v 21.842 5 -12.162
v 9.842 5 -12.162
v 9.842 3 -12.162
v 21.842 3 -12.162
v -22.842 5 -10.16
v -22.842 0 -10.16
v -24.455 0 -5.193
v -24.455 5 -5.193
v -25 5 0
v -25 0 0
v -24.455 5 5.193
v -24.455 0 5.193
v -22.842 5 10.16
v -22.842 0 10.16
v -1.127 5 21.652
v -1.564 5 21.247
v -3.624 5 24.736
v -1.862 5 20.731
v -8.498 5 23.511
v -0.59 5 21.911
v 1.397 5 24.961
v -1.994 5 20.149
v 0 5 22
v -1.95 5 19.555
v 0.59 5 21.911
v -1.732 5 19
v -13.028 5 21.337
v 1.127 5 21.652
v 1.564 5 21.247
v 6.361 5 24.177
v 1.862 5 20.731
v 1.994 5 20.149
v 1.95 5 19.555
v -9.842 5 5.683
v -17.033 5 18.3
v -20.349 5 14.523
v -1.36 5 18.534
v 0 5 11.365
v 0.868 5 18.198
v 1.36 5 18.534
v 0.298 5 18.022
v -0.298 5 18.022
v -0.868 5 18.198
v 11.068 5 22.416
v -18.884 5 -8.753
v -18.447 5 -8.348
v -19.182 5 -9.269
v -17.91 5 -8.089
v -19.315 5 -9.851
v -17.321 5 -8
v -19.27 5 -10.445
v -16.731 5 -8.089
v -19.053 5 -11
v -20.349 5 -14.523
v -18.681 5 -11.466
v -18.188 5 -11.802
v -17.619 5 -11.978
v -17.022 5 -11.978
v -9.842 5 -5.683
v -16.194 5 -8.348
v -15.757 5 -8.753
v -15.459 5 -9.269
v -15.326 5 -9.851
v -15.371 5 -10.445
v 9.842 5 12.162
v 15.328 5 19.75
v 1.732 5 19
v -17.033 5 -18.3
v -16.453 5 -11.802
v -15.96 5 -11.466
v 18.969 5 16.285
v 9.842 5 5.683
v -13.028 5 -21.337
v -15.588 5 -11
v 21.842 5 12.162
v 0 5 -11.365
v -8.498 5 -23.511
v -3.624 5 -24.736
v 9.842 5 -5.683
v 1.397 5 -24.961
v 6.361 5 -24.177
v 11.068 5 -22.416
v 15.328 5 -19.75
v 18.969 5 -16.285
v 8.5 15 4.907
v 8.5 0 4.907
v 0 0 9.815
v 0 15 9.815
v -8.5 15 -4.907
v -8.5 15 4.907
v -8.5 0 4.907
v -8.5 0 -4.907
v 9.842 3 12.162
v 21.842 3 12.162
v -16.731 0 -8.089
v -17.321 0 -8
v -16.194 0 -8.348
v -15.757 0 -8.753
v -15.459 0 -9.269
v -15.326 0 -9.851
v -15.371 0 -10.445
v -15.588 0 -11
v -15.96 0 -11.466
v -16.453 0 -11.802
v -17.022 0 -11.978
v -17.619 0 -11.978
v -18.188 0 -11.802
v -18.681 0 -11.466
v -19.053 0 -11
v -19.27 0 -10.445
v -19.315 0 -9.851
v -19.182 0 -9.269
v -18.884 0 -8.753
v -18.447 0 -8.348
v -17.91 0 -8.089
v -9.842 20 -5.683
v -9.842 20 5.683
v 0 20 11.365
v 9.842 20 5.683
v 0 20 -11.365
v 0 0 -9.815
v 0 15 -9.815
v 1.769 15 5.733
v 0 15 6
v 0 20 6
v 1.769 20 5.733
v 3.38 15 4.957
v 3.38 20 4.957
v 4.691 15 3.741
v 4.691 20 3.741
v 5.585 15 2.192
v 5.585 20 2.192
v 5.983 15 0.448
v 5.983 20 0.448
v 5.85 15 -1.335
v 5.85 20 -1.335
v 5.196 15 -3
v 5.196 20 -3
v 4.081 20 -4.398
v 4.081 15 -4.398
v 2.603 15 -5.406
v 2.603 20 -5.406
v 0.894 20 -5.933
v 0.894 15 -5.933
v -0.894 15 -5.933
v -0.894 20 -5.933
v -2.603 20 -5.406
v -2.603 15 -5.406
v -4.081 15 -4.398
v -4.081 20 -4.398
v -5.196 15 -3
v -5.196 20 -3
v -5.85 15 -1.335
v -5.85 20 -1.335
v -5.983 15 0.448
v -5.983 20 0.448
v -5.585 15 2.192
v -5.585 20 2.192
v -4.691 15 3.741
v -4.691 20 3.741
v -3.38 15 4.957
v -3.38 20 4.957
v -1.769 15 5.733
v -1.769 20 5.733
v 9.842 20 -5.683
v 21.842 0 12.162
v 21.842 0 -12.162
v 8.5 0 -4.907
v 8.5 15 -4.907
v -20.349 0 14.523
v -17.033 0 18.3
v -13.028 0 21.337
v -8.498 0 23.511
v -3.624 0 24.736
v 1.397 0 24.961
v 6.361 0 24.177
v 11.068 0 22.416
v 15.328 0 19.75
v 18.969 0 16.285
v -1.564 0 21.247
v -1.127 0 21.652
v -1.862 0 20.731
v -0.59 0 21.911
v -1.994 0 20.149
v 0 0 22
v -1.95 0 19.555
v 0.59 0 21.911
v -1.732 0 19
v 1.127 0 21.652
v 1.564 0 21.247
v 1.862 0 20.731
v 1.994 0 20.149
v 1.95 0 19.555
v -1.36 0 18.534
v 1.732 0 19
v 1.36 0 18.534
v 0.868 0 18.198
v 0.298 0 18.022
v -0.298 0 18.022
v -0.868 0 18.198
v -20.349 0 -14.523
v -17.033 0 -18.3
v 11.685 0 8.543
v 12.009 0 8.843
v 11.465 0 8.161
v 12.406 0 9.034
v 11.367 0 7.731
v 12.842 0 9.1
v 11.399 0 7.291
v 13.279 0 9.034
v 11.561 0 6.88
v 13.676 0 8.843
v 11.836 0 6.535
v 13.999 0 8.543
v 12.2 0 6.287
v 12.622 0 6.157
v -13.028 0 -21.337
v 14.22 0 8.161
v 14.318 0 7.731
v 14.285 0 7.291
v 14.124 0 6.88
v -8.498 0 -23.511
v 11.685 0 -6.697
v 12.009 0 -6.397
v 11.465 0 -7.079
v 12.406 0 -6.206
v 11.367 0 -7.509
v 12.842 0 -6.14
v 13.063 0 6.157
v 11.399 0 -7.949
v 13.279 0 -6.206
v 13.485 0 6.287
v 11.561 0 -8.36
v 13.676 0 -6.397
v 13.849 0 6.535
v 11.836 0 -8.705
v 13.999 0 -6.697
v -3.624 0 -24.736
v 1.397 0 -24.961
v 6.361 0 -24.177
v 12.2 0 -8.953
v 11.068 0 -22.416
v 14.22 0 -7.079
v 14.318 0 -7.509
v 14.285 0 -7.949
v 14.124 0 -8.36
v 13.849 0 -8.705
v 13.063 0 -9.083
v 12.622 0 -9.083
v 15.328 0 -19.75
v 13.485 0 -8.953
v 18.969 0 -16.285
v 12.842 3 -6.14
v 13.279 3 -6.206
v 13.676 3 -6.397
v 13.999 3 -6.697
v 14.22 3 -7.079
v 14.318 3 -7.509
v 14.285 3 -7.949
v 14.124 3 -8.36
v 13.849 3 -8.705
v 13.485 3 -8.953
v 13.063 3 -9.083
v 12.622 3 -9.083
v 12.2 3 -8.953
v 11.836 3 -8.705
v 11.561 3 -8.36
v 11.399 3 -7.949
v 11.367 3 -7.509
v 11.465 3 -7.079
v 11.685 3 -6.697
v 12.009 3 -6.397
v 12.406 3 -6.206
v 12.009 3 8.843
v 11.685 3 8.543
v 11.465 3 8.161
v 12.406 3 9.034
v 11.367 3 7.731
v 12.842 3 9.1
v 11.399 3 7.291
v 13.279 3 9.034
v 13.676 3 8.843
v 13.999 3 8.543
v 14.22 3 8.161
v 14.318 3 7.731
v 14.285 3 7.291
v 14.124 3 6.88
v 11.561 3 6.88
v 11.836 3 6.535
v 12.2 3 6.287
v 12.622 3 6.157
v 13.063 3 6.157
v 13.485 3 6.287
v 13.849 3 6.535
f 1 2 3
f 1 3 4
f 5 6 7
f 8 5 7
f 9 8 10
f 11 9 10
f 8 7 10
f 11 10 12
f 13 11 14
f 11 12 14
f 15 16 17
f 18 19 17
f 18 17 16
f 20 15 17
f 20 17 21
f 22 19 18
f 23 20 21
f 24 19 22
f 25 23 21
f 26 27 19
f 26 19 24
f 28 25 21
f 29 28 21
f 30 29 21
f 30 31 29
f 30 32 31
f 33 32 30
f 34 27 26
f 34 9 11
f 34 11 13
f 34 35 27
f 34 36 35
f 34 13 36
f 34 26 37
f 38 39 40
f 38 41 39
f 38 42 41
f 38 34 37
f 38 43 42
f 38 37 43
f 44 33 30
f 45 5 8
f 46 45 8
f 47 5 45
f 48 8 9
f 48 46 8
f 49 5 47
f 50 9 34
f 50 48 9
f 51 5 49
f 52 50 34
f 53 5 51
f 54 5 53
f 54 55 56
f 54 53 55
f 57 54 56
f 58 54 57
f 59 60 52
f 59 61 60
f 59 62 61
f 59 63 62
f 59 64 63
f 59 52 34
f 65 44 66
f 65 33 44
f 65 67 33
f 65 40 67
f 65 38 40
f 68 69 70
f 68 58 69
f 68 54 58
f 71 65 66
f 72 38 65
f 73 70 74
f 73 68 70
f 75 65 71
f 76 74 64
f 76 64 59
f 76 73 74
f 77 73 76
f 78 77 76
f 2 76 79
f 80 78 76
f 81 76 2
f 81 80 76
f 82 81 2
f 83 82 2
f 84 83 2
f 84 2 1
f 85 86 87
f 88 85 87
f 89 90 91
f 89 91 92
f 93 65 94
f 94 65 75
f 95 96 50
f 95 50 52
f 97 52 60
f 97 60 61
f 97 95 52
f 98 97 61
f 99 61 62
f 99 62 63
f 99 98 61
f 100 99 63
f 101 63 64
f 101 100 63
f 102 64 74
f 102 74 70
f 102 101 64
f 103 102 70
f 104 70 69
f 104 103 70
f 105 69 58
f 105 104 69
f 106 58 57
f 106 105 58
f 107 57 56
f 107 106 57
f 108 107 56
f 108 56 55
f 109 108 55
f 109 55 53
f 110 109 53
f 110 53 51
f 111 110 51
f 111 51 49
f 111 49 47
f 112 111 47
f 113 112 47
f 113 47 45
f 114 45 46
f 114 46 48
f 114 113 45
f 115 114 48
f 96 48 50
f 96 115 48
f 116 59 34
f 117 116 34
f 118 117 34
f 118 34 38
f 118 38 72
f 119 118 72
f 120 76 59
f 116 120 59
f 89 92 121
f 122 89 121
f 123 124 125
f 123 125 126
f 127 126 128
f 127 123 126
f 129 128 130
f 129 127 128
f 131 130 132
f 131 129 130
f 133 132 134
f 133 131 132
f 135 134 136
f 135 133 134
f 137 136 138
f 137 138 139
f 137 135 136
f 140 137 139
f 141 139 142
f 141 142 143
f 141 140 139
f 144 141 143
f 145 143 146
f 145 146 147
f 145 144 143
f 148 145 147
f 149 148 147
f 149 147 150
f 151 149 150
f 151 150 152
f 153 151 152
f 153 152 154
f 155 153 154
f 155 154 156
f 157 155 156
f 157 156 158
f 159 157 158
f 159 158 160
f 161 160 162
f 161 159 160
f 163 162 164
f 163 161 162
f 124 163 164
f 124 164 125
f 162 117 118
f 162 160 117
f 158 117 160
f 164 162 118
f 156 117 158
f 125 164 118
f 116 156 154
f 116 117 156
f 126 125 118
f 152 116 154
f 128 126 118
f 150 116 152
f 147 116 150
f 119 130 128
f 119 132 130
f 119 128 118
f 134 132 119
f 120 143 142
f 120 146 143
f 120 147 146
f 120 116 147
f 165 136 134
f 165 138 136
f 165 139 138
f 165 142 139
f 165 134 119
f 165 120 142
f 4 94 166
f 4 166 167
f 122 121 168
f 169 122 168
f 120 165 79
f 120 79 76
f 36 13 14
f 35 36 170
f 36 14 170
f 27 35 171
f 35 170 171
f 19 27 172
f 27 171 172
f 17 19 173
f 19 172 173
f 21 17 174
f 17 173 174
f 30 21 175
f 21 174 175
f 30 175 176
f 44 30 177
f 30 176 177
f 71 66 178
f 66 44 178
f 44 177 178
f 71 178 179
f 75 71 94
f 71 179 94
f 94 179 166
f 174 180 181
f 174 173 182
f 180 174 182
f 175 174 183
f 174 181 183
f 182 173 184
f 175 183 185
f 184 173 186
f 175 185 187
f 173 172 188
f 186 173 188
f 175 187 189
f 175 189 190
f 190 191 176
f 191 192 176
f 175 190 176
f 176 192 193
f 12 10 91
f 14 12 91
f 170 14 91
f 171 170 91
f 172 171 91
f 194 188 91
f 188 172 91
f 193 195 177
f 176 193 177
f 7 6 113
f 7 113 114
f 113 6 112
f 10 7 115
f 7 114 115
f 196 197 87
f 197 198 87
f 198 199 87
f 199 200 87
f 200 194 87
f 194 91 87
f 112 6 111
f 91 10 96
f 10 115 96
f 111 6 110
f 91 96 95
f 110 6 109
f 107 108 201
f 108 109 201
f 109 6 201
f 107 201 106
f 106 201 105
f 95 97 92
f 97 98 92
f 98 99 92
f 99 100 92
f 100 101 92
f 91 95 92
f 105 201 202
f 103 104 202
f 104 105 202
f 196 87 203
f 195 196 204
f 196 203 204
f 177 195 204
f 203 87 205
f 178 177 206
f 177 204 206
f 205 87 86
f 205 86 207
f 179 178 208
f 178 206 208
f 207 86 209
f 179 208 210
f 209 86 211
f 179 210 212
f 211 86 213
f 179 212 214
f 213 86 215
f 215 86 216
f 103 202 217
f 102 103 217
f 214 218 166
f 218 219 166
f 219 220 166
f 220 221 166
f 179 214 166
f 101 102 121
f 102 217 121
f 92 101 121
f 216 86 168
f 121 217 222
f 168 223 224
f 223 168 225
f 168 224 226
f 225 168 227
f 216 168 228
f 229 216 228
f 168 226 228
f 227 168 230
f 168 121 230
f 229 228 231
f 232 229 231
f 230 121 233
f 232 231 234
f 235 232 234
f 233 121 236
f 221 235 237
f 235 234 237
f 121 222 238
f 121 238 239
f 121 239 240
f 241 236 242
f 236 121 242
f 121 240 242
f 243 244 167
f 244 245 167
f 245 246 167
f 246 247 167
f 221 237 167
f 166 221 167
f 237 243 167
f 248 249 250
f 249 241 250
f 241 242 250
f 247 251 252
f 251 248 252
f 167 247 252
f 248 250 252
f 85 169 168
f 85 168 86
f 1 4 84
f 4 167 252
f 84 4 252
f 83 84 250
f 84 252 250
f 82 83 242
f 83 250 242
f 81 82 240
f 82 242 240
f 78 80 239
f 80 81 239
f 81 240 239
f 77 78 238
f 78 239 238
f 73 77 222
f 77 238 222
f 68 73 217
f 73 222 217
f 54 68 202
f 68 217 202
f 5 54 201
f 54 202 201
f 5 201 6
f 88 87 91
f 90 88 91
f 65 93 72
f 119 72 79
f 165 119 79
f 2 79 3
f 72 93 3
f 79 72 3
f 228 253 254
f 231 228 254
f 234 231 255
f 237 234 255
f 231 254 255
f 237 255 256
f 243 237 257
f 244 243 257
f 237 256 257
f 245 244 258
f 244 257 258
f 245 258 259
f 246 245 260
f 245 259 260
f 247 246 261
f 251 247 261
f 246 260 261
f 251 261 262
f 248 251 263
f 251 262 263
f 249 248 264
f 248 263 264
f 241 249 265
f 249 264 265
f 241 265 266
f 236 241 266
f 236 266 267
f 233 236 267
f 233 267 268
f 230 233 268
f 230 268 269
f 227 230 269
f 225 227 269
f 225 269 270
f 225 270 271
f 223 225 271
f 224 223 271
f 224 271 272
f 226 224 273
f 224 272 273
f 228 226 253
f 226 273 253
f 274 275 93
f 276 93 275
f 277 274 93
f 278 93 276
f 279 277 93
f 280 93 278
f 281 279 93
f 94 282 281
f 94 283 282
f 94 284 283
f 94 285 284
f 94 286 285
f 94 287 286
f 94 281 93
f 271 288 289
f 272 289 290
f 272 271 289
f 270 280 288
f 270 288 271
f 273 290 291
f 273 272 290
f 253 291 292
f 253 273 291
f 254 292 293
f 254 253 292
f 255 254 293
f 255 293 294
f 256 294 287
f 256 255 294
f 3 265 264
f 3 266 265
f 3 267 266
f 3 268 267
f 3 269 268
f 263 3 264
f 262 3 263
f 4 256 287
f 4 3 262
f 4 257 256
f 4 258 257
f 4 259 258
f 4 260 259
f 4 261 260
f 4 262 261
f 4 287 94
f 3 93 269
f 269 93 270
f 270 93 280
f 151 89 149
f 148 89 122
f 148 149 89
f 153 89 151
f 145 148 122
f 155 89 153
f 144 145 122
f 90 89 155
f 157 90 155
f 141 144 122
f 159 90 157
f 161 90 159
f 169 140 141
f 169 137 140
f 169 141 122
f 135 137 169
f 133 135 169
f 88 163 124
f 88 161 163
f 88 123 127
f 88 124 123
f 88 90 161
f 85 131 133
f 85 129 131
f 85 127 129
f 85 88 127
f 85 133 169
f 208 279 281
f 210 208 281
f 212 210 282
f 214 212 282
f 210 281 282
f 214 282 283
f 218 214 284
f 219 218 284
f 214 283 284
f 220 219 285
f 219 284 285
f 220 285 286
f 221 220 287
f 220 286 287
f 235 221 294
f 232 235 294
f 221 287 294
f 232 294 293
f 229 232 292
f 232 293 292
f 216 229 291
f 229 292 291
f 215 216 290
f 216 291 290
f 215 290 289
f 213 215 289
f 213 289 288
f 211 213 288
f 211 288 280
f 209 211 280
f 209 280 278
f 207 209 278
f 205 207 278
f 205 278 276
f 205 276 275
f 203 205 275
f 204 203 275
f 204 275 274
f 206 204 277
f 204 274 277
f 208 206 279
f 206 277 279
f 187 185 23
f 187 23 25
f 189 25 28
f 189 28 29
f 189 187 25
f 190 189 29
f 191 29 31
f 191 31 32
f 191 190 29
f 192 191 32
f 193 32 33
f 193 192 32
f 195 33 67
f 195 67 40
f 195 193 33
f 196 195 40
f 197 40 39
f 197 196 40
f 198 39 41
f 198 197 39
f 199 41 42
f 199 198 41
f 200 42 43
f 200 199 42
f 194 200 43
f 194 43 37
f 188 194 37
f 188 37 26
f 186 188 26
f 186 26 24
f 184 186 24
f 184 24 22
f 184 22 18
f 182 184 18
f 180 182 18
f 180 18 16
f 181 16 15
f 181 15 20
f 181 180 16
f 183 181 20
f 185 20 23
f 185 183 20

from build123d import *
from build123d.topology import SkipClean

# Parameters (mm, degrees)
SKETCH_1_R           = 25
SKETCH_1_R_2         = 2
SKETCH_1_R_3         = 15
EXTRUDE_1_DEPTH      = 5
EXTRUDE_START        = -5
EXTRUDE_2_DEPTH      = 5
CUT_EXTRUDE_START    = -5
SKETCH_3_R           = 1.48
CUT_EXTRUDE_1_DEPTH  = 5
SKETCH_4_W           = 8.547618338
SKETCH_4_H           = 20.32
SKETCH_4_R           = 1.48
SKETCH_4_R_2         = 1.532611102
EXTRUDE_3_DEPTH      = 25
SKETCH_5_R           = 1.48
EXTRUDE_4_DEPTH      = 15
SKETCH_6_W           = 8.547618338
SKETCH_6_H           = 20.32
CUT_EXTRUDE_2_DEPTH  = 10
CUT_EXTRUDE_START_2  = -15
SKETCH_7_R           = 1.48
SKETCH_7_R_2         = 1.532611102
CUT_EXTRUDE_3_DEPTH  = 15
EXTRUDE_5_DEPTH      = 15
SKETCH_9_W           = 8.547618338
SKETCH_9_H           = 20.32
CUT_EXTRUDE_4_DEPTH  = 20
SKETCH_10_W          = 8.54761834
SKETCH_10_H          = 20.32
EXTRUDE_6_DEPTH      = 10
EXTRUDE_7_DEPTH      = 5
CUT_EXTRUDE_5_DEPTH  = 30
SKETCH_13_R          = 15
SKETCH_13_R_2        = 6.5
EXTRUDE_8_DEPTH      = 5
SKETCH_14_R          = 1.48
CUT_EXTRUDE_6_DEPTH  = 5
SKETCH_15_W          = 14.772216158
SKETCH_15_H          = 22.255287634
CUT_EXTRUDE_7_DEPTH  = 15
SKETCH_16_R          = 6.5
SKETCH_16_R_2        = 6
EXTRUDE_9_DEPTH      = 5
CUT_EXTRUDE_START_3  = -2
SKETCH_17_W          = 6.857896117
SKETCH_17_H          = 20.32
SKETCH_17_R          = 1.48
CUT_EXTRUDE_8_DEPTH  = 2
CUT_EXTRUDE_9_DEPTH  = 2
SKETCH_19_W          = 12
SKETCH_19_H          = 24.323680916
CUT_EXTRUDE_10_DEPTH = 2
EXTRUDE_START_2      = -3
SKETCH_20_R          = 2
EXTRUDE_10_DEPTH     = 3
SKETCH_21_R          = 1.48
CUT_EXTRUDE_11_DEPTH = 3
SKETCH_22_W          = 10.536991634
SKETCH_22_H          = 24.323680916
CUT_EXTRUDE_12_DEPTH = 3
SKETCH_23_R          = 9.842381662
SKETCH_23_R_2        = 6
EXTRUDE_11_DEPTH     = 15
CUT_EXTRUDE_13_DEPTH = 15
EXTRUDE_START_3      = -15
SKETCH_25_R          = 6
EXTRUDE_12_DEPTH     = 15
CUT_EXTRUDE_14_DEPTH = 15


with BuildPart() as part:
    # 草图1 → 凸台-拉伸1 (new body)
    with BuildSketch(Plane(origin=(0, 0, 0), x_dir=(1, 0, 0), z_dir=(0, 1, 0))):
        with Locations(Location((0, 0, 0), (0, 0, 270))):
            Circle(SKETCH_1_R)
        with Locations(Location((-17.320508076, 10, 0), (0, 0, 270))):
            Circle(SKETCH_1_R_2, mode=Mode.SUBTRACT)
        with Locations(Location((17.320508076, 10, 0), (0, 0, 270))):
            Circle(SKETCH_1_R_2, mode=Mode.SUBTRACT)
        with Locations(Location((0, -20, 0), (0, 0, 270))):
            Circle(SKETCH_1_R_2, mode=Mode.SUBTRACT)
        with Locations(Location((0, 0, 0), (0, 0, 270))):
            Circle(SKETCH_1_R_3, mode=Mode.SUBTRACT)
    extrude(amount=EXTRUDE_1_DEPTH)

    # 草图2 → 凸台-拉伸2 (add)
    with BuildSketch(Plane(origin=(0, 5, 0), x_dir=(1, 0, 0), z_dir=(0, 1, 0)).offset(EXTRUDE_START)):
        with BuildLine():
            Line((-22.842381662, 10.16), (-31.39, 10.16))
            Line((-31.39, 10.16), (-31.39, -10.16))
            Line((-31.39, -10.16), (-22.842381662, -10.16))
            ThreePointArc((-22.842381662, -10.16), (-23.266520659, -9.147076932), (-23.645768039, -8.116505025))
            ThreePointArc((-23.645768039, -8.116505025), (-26.455891038, -8.05087419), (-24.158684413, -6.431016049))
            ThreePointArc((-24.158684413, -6.431016049), (-25, 0), (-24.158684413, 6.431016049))
            ThreePointArc((-24.158684413, 6.431016049), (-26.455891038, 8.05087419), (-23.645768039, 8.116505025))
            ThreePointArc((-23.645768039, 8.116505025), (-23.266520659, 9.147076932), (-22.842381662, 10.16))
        make_face()
        with BuildLine():
            Line((-22.842381662, -10.16), (-22.842381662, 10.16))
            ThreePointArc((-22.842381662, 10.16), (-23.266520659, 9.147076932), (-23.645768039, 8.116505025))
            ThreePointArc((-23.645768039, 8.116505025), (-23.581599626, 7.871929254), (-23.56, 7.62))
            ThreePointArc((-23.56, 7.62), (-23.718117428, 6.954397667), (-24.158684413, 6.431016049))
            ThreePointArc((-24.158684413, 6.431016049), (-25, 0), (-24.158684413, -6.431016049))
            ThreePointArc((-24.158684413, -6.431016049), (-23.718117428, -6.954397667), (-23.56, -7.62))
            ThreePointArc((-23.56, -7.62), (-23.581599626, -7.871929254), (-23.645768039, -8.116505025))
            ThreePointArc((-23.645768039, -8.116505025), (-23.266520659, -9.147076932), (-22.842381662, -10.16))
        make_face()
    extrude(amount=EXTRUDE_2_DEPTH)

    # 草图3 → 切除-拉伸1 (cut)
    with BuildSketch(Plane(origin=(0, 5, 0), x_dir=(1, 0, 0), z_dir=(0, 1, 0)).offset(CUT_EXTRUDE_START)):
        with Locations(Location((-25.04, 7.62, 0), (0, 0, 270))):
            Circle(SKETCH_3_R)
        with Locations(Location((-25.04, -7.62, 0), (0, 0, 270))):
            Circle(SKETCH_3_R)
    extrude(amount=CUT_EXTRUDE_1_DEPTH, mode=Mode.SUBTRACT)

    # 草图4 → 凸台-拉伸3 (add)
    with SkipClean():  # the faces are left unmerged after this step: merging them gives an invalid solid
        with BuildSketch(Plane(origin=(0, 5, 0), x_dir=(1, 0, 0), z_dir=(0, 1, 0))):
            with Locations((-27.116190831, 0)):
                Rectangle(SKETCH_4_W, SKETCH_4_H)
            with Locations(Location((-25.04, 7.62, 0), (0, 0, 270))):
                Circle(SKETCH_4_R, mode=Mode.SUBTRACT)
            with Locations(Location((-25.04, -7.62, 0), (0, 0, 270))):
                Circle(SKETCH_4_R_2, mode=Mode.SUBTRACT)
        extrude(amount=EXTRUDE_3_DEPTH)

    # 草图5 → 凸台-拉伸4 (add)
    with BuildSketch(Plane.XZ):
        with Locations(Location((-25.04, 7.62, 0), (0, 0, 270))):
            Circle(SKETCH_5_R)
        with Locations(Location((-25.04, -7.62, 0), (0, 0, 90))):
            Circle(SKETCH_5_R)
    extrude(amount=-EXTRUDE_4_DEPTH)

    # 草图6 → 切除-拉伸2 (cut)
    with BuildSketch(Plane(origin=(0, 30, 0), x_dir=(1, 0, 0), z_dir=(0, 1, 0))):
        with Locations((-27.116190831, 0)):
            Rectangle(SKETCH_6_W, SKETCH_6_H)
    extrude(amount=-CUT_EXTRUDE_2_DEPTH, mode=Mode.SUBTRACT)

    # 草图7 → 切除-拉伸3 (cut)
    with BuildSketch(Plane(origin=(0, 20, 0), x_dir=(1, 0, 0), z_dir=(0, 1, 0)).offset(CUT_EXTRUDE_START_2)):
        with Locations(Location((-25.04, 7.62, 0), (0, 0, 270))):
            Circle(SKETCH_7_R)
        with Locations(Location((-25.04, -7.62, 0), (0, 0, 270))):
            Circle(SKETCH_7_R_2)
    extrude(amount=CUT_EXTRUDE_3_DEPTH, mode=Mode.SUBTRACT)

    # 草图8 → 凸台-拉伸5 (add)
    with BuildSketch(Plane(origin=(0, 5, 0), x_dir=(1, 0, 0), z_dir=(0, 1, 0))):
        with BuildLine():
            Line((31.390000002, 10.16), (22.842381662, 10.16))
            ThreePointArc((22.842381662, 10.16), (23.266520659, 9.147076932), (23.645768039, 8.116505025))
            ThreePointArc((23.645768039, 8.116505025), (25.291929254, 9.078400374), (26.52, 7.62))
            ThreePointArc((26.52, 7.62), (25.705602333, 6.298117428), (24.158684413, 6.431016049))
            ThreePointArc((24.158684413, 6.431016049), (25, 0), (24.158684413, -6.431016049))
            ThreePointArc((24.158684413, -6.431016049), (25.705602333, -6.298117428), (26.52, -7.62))
            ThreePointArc((26.52, -7.62), (25.291929254, -9.078400374), (23.645768039, -8.116505025))
            ThreePointArc((23.645768039, -8.116505025), (23.266520659, -9.147076932), (22.842381662, -10.16))
            Line((22.842381662, -10.16), (31.390000002, -10.16))
            Line((31.390000002, -10.16), (31.390000002, 10.16))
        make_face()
        with BuildLine():
            ThreePointArc((23.645768039, 8.116505025), (23.266520659, 9.147076932), (22.842381662, 10.16))
            Line((22.842381662, 10.16), (22.842381662, -10.16))
            ThreePointArc((22.842381662, -10.16), (23.266520659, -9.147076932), (23.645768039, -8.116505025))
            ThreePointArc((23.645768039, -8.116505025), (23.624108962, -7.18912581), (24.158684413, -6.431016049))
            ThreePointArc((24.158684413, -6.431016049), (25, 0), (24.158684413, 6.431016049))
            ThreePointArc((24.158684413, 6.431016049), (23.624108962, 7.18912581), (23.645768039, 8.116505025))
        make_face()
    extrude(amount=EXTRUDE_5_DEPTH)

    # 草图9 → 切除-拉伸4 (cut)
    with BuildSketch(Plane(origin=(0, 20, 0), x_dir=(1, 0, 0), z_dir=(0, 1, 0))):
        with Locations((-27.116190831, 0)):
            Rectangle(SKETCH_9_W, SKETCH_9_H)
    extrude(amount=-CUT_EXTRUDE_4_DEPTH, mode=Mode.SUBTRACT)

    # 草图10 → 凸台-拉伸6 (add)
    with BuildSketch(Plane.XZ):
        with Locations((27.116190832, 0)):
            Rectangle(SKETCH_10_W, SKETCH_10_H)
    extrude(amount=-EXTRUDE_6_DEPTH)

    # 草图11 → 凸台-拉伸7 (add)
    with BuildSketch(Plane(origin=(0, 5, 0), x_dir=(1, 0, 0), z_dir=(0, 1, 0)).offset(EXTRUDE_START)):
        with BuildLine():
            Line((-22.842381662, -10.16), (-22.842381662, 10.16))
            ThreePointArc((-22.842381662, 10.16), (-25, 0), (-22.842381662, -10.16))
        make_face()
    extrude(amount=EXTRUDE_7_DEPTH)

    # 草图12 → 切除-拉伸5 (cut)
    with BuildSketch(Plane.XZ):
        with BuildLine():
            ThreePointArc((29.700277779, 10.16), (30.964688111, 5.149775752), (31.390000002, 0))
            Line((31.390000002, 0), (31.390000002, 10.16))
            Line((31.390000002, 10.16), (29.700277779, 10.16))
        make_face()
        with BuildLine():
            ThreePointArc((31.390000002, 0), (30.964688111, -5.149775752), (29.700277779, -10.16))
            Line((29.700277779, -10.16), (31.390000002, -10.16))
            Line((31.390000002, -10.16), (31.390000002, 0))
        make_face()
    extrude(amount=-CUT_EXTRUDE_5_DEPTH, mode=Mode.SUBTRACT)

    # 草图13 → 凸台-拉伸8 (add)
    with BuildSketch(Plane.XZ):
        Circle(SKETCH_13_R)
        with Locations(Location((0, 0, 0), (0, 0, 270))):
            Circle(SKETCH_13_R_2, mode=Mode.SUBTRACT)
    extrude(amount=-EXTRUDE_8_DEPTH)

    # 草图14 → 切除-拉伸6 (cut)
    with BuildSketch(Plane(origin=(0, 5, 0), x_dir=(1, 0, 0), z_dir=(0, 1, 0)).offset(CUT_EXTRUDE_START)):
        with Locations(Location((25.04, 7.62, 0), (0, 0, 270))):
            Circle(SKETCH_14_R)
        with Locations(Location((25.04, -7.62, 0), (0, 0, 270))):
            Circle(SKETCH_14_R)
    extrude(amount=CUT_EXTRUDE_6_DEPTH, mode=Mode.SUBTRACT)

    # 草图15 → 切除-拉伸7 (cut)
    with BuildSketch(Plane(origin=(0, 20, 0), x_dir=(1, 0, 0), z_dir=(0, 1, 0))):
        with Locations((30.228489741, -0.967643817)):
            Rectangle(SKETCH_15_W, SKETCH_15_H)
    extrude(amount=-CUT_EXTRUDE_7_DEPTH, mode=Mode.SUBTRACT)

    # 草图16 → 凸台-拉伸9 (add)
    with BuildSketch(Plane(origin=(0, 5, 0), x_dir=(1, 0, 0), z_dir=(0, 1, 0)).offset(EXTRUDE_START)):
        Circle(SKETCH_16_R)
        with Locations(Location((0, 0, 0), (0, 0, 270))):
            Circle(SKETCH_16_R_2, mode=Mode.SUBTRACT)
    extrude(amount=EXTRUDE_9_DEPTH)

    # 草图17 → 切除-拉伸8 (cut)
    # profile 1 of 3: a face of its own
    with BuildSketch(Plane(origin=(0, 5, 0), x_dir=(1, 0, 0), z_dir=(0, 1, 0)).offset(CUT_EXTRUDE_START_3)):
        with Locations((26.27132972, 0)):
            Rectangle(SKETCH_17_W, SKETCH_17_H)
        with Locations(Location((25.04, 7.62, 0), (0, 0, 270))):
            Circle(SKETCH_17_R, mode=Mode.SUBTRACT)
        with Locations(Location((25.04, -7.62, 0), (0, 0, 270))):
            Circle(SKETCH_17_R, mode=Mode.SUBTRACT)
    # profile 2 of 3: a face of its own
    with BuildSketch(Plane(origin=(0, 5, 0), x_dir=(1, 0, 0), z_dir=(0, 1, 0)).offset(CUT_EXTRUDE_START_3)):
        with BuildLine():
            Line((33.817210561, 10.16), (33.817210561, -10.16))
            Line((33.817210561, -10.16), (29.700277779, -10.16))
            ThreePointArc((29.700277779, -10.16), (31.390000002, 0), (29.700277779, 10.16))
            Line((29.700277779, 10.16), (33.817210561, 10.16))
        make_face()
    # profile 3 of 3: a face of its own
    with BuildSketch(Plane(origin=(0, 5, 0), x_dir=(1, 0, 0), z_dir=(0, 1, 0)).offset(CUT_EXTRUDE_START_3)):
        with BuildLine():
            Line((29.700277779, -10.16), (29.700277779, 10.16))
            ThreePointArc((29.700277779, 10.16), (31.390000002, 0), (29.700277779, -10.16))
        make_face()
    extrude(amount=CUT_EXTRUDE_8_DEPTH, mode=Mode.SUBTRACT)

    # 草图18 → 切除-拉伸9 (cut)
    with BuildSketch(Plane(origin=(0, 5, 0), x_dir=(1, 0, 0), z_dir=(0, 1, 0)).offset(CUT_EXTRUDE_START_3)):
        with BuildLine():
            Line((21.842381662, 0), (22.842381662, 0))
            Line((22.842381662, 0), (22.842381662, 10.16))
            ThreePointArc((22.842381662, 10.16), (22.364790624, 11.172114409), (21.842381662, 12.161840458))
            Line((21.842381662, 12.161840458), (21.842381662, 0))
        make_face()
        with BuildLine():
            Line((22.842381662, -10.16), (22.842381662, 0))
            Line((22.842381662, 0), (21.842381662, 0))
            Line((21.842381662, 0), (21.842381662, -12.161840458))
            ThreePointArc((21.842381662, -12.161840458), (22.364790624, -11.172114409), (22.842381662, -10.16))
        make_face()
    extrude(amount=CUT_EXTRUDE_9_DEPTH, mode=Mode.SUBTRACT)

    # 草图19 → 切除-拉伸10 (cut)
    with BuildSketch(Plane(origin=(0, 5, 0), x_dir=(1, 0, 0), z_dir=(0, 1, 0))):
        with Locations((15.842381662, 0)):
            Rectangle(SKETCH_19_W, SKETCH_19_H)
    extrude(amount=-CUT_EXTRUDE_10_DEPTH, mode=Mode.SUBTRACT)

    # 草图20 → 凸台-拉伸10 (add)
    with BuildSketch(Plane(origin=(0, 3, 0), x_dir=(1, 0, 0), z_dir=(0, 1, 0)).offset(EXTRUDE_START_2)):
        with Locations((17.320508076, 10)):
            Circle(SKETCH_20_R)
    extrude(amount=EXTRUDE_10_DEPTH)

    # 草图21 → 切除-拉伸11 (cut)
    with BuildSketch(Plane(origin=(0, 3, 0), x_dir=(1, 0, 0), z_dir=(0, 1, 0))):
        with Locations(Location((12.842381662, 7.62, 0), (0, 0, 270))):
            Circle(SKETCH_21_R)
        with Locations(Location((12.842381662, -7.62, 0), (0, 0, 270))):
            Circle(SKETCH_21_R)
    extrude(amount=-CUT_EXTRUDE_11_DEPTH, mode=Mode.SUBTRACT)

    # 草图22 → 切除-拉伸12 (cut)
    with BuildSketch(Plane(origin=(0, 3, 0), x_dir=(1, 0, 0), z_dir=(0, 1, 0))):
        with Locations((27.110877479, 0)):
            Rectangle(SKETCH_22_W, SKETCH_22_H)
    extrude(amount=-CUT_EXTRUDE_12_DEPTH, mode=Mode.SUBTRACT)

    # 草图23 → 凸台-拉伸11 (add)
    with BuildSketch(Plane(origin=(0, 5, 0), x_dir=(1, 0, 0), z_dir=(0, 1, 0))):
        Circle(SKETCH_23_R)
        with Locations(Location((0, 0, 0), (0, 0, 270))):
            Circle(SKETCH_23_R_2, mode=Mode.SUBTRACT)
    extrude(amount=EXTRUDE_11_DEPTH)

    # 草图24 → 切除-拉伸13 (cut)
    with BuildSketch(Plane.XZ):
        Polygon((8.5, 4.907477288), (0, 9.814954576), (-8.5, 4.907477288), (-8.5, -4.907477288), (0, -9.814954576), (8.5, -4.907477288), align=None)
    extrude(amount=-CUT_EXTRUDE_13_DEPTH, mode=Mode.SUBTRACT)

    # 草图25 → 凸台-拉伸12 (add)
    with BuildSketch(Plane(origin=(0, 20, 0), x_dir=(1, 0, 0), z_dir=(0, 1, 0)).offset(EXTRUDE_START_3)):
        Polygon((9.842381662, 5.682501702), (0, 11.365003404), (-9.842381662, 5.682501702), (-9.842381662, -5.682501702), (0, -11.365003404), (9.842381662, -5.682501702), align=None)
        with Locations(Location((0, 0, 0), (0, 0, 270))):
            Circle(SKETCH_25_R, mode=Mode.SUBTRACT)
    extrude(amount=EXTRUDE_12_DEPTH)

    # 草图27 → 切除-拉伸14 (cut)
    with BuildSketch(Plane.XZ):
        Polygon((0, 9.814954576), (-8.5, 4.907477288), (-8.5, -4.907477288), (0, -9.814954576), (8.5, -4.907477288), (8.5, 4.907477288), align=None)
    extrude(amount=-CUT_EXTRUDE_14_DEPTH, mode=Mode.SUBTRACT)


solid = part.part
